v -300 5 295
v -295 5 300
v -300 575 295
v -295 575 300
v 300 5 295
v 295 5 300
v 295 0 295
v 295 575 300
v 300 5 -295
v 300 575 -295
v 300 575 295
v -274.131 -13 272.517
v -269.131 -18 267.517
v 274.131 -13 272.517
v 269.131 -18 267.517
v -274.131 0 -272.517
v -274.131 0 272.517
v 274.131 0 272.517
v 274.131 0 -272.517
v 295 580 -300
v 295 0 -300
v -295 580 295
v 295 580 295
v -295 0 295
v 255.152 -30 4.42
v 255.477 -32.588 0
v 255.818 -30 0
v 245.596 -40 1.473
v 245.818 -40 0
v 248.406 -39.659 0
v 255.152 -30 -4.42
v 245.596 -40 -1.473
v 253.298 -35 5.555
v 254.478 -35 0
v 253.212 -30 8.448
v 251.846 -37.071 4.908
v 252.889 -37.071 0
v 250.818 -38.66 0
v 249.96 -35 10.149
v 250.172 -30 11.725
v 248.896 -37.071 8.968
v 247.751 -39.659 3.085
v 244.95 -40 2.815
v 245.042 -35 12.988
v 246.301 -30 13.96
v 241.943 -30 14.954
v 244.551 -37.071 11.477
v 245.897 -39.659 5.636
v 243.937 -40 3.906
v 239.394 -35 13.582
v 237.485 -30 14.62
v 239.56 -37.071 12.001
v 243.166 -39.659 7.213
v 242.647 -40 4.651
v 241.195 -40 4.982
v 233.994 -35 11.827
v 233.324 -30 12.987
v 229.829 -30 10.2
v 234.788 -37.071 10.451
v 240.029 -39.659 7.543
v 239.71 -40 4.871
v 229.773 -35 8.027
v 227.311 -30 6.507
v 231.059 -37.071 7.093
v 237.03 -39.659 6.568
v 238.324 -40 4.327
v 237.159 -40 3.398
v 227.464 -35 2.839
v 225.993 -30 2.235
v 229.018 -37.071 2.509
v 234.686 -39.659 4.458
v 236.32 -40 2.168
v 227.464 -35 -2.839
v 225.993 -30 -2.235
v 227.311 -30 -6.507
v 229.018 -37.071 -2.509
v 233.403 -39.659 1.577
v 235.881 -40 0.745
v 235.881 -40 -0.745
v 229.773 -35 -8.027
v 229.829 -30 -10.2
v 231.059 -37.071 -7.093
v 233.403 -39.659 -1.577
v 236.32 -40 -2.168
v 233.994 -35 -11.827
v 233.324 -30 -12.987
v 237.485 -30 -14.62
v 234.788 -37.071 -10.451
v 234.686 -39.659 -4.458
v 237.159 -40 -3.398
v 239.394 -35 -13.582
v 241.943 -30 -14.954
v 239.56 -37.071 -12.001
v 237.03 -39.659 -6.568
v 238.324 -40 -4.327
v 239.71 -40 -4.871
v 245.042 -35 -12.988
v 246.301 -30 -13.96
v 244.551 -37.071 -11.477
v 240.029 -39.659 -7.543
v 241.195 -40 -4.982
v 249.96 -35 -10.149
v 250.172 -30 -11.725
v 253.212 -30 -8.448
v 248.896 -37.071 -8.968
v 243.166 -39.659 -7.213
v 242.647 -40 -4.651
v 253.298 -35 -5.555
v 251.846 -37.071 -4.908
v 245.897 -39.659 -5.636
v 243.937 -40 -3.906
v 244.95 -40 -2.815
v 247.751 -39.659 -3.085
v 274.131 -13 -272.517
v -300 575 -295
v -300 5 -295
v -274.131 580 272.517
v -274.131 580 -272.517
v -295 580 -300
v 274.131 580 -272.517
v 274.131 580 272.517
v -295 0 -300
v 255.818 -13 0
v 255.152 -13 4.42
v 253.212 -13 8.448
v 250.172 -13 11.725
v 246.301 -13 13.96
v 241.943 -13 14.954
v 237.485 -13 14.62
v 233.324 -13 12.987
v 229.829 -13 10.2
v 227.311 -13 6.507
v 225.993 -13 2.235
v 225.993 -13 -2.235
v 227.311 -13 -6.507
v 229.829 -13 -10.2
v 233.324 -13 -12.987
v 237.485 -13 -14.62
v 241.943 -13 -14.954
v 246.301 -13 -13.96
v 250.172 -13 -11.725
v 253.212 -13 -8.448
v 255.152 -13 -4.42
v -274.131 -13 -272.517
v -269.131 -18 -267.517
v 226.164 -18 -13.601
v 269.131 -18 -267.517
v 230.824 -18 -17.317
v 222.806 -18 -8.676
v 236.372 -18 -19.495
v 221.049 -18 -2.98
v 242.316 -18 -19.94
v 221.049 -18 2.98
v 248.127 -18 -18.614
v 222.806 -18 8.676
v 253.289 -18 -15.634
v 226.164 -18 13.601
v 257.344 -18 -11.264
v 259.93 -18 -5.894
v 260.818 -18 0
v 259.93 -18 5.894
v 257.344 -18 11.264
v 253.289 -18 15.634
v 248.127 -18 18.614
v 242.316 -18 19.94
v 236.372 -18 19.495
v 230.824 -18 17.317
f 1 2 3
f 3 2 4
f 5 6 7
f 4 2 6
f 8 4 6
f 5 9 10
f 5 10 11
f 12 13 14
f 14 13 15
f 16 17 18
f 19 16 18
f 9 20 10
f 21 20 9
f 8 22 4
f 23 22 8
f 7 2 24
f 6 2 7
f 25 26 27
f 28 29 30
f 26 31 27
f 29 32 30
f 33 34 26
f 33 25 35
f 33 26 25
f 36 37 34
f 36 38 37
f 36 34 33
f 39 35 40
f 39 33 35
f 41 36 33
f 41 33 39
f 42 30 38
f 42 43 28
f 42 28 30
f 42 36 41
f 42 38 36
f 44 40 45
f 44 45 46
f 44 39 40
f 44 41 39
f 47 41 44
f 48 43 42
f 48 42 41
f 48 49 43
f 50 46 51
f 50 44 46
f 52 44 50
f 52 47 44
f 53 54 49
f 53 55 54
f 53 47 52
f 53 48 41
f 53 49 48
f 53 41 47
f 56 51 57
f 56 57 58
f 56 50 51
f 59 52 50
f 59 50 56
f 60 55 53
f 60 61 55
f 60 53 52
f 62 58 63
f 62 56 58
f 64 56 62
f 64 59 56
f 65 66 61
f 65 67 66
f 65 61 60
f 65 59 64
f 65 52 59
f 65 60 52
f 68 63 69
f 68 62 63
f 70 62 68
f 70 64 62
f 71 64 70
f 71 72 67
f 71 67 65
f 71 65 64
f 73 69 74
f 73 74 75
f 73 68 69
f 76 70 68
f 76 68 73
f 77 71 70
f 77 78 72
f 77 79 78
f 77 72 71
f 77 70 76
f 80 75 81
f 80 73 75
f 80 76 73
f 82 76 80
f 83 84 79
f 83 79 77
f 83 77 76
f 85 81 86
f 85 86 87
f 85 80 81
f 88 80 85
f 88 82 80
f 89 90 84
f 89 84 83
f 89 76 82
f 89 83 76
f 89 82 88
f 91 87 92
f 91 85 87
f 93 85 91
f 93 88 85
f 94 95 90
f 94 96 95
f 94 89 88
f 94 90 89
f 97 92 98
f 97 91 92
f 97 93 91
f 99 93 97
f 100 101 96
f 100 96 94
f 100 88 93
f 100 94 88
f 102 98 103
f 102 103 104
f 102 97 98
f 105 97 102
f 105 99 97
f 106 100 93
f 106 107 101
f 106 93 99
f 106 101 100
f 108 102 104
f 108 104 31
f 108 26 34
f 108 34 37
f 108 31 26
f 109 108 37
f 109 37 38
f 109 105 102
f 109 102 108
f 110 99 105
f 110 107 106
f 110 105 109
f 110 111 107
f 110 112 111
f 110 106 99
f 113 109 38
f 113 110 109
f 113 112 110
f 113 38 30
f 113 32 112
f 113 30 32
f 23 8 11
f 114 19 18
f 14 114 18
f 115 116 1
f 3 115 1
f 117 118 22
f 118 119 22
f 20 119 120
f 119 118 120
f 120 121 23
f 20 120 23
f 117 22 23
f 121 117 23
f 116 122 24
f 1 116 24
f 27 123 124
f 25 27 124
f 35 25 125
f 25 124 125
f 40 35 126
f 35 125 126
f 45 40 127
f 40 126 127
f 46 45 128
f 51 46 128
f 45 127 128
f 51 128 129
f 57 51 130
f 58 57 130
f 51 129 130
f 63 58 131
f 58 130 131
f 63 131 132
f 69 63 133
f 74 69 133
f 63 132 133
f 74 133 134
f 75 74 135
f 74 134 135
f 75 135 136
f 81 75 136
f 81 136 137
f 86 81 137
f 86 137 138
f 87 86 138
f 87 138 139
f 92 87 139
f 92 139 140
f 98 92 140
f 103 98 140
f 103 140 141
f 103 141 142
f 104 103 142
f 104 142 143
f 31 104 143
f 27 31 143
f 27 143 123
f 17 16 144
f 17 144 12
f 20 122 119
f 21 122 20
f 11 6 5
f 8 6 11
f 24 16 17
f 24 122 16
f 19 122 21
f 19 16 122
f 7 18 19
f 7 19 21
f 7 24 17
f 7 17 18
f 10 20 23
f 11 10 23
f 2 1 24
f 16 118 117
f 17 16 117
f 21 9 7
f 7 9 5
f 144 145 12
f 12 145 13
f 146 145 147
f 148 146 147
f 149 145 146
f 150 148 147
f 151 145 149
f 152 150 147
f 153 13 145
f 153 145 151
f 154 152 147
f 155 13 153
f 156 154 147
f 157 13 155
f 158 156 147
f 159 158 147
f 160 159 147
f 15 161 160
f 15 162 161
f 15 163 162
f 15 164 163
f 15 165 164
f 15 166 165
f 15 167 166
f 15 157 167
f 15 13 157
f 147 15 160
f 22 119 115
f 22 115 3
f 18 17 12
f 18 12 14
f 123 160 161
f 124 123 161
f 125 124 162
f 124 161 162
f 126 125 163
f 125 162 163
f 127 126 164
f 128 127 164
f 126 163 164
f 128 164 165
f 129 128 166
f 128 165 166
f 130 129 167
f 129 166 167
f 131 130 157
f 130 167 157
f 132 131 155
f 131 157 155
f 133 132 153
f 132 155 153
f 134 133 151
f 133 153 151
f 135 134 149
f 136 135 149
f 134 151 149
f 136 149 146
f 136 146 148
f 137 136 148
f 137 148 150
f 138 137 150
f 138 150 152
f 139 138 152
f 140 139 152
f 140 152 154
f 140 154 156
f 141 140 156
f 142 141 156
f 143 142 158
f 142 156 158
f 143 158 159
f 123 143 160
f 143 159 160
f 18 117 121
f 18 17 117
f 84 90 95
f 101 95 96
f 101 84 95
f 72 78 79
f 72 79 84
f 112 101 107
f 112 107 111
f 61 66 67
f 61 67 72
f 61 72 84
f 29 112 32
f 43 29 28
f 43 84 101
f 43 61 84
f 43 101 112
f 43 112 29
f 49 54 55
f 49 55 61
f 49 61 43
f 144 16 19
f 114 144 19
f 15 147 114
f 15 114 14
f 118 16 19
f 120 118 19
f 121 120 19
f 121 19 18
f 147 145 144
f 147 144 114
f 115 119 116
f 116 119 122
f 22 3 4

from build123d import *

# Parameters (mm, degrees)
F0_W      = 600
F0_H      = 600
F0_W_2    = 548.26182127
F0_H_2    = 545.0347065926
F1_DEPTH  = 550
F2_DEPTH  = 30
F0_R      = 14.9962807739
F3_DEPTH  = 18
F4_SIZE   = 5
F4_2_SIZE = 5
F5_DEPTH  = 40
F6_R      = 10


with BuildPart() as f1:
    # F0 (on Front) → F1 (new body)
    with BuildSketch(Plane.XZ):
        Rectangle(F0_W, F0_H)
        Rectangle(F0_W_2, F0_H_2, mode=Mode.SUBTRACT)
    extrude(amount=-F1_DEPTH)

    # F2 (add): a face of the model
    f2_faces = [f1.faces().sort_by_distance(p)[0] for p in [
        (0, 550, 291.5147186258),
    ]]
    extrude(f2_faces, amount=F2_DEPTH)

    # F4
    f4_edges = [f1.edges().sort_by_distance(p)[0] for p in [
        (-300, 290, 300),
        (-300, 580, 0),
        (-300, 290, -300),
        (-300, 0, 0),
        (300, 290, 300),
        (0, 580, 300),
        (0, 0, 300),
        (300, 290, -300),
        (300, 580, 0),
        (300, 0, 0),
    ]]
    chamfer(f4_edges, length=F4_SIZE)


with BuildPart() as f3:
    # F0 (on Front) → F3 (new body)
    with BuildSketch(Plane.XZ):
        Rectangle(F0_W_2, F0_H_2)
        with Locations((240.8218532801, 0)):
            Circle(F0_R, mode=Mode.SUBTRACT)
    extrude(amount=F3_DEPTH)

    # F4#2
    f4_2_edges = [f3.edges().sort_by_distance(p)[0] for p in [
        (0, -18, 272.517353),
        (-274.130911, -18, 0),
        (0, -18, -272.517353),
        (274.130911, -18, 0),
        (225.825573, -18, 0),
    ]]
    chamfer(f4_2_edges, length=F4_2_SIZE)

    # F0 (on Front) → F5 (join)
    with BuildSketch(Plane.XZ):
        with Locations((240.8218532801, 0)):
            Circle(F0_R)
    extrude(amount=F5_DEPTH)

    # F6
    f6_edges = [f3.edges().sort_by_distance(p)[0] for p in [
        (225.825573, -40, 0),
    ]]
    fillet(f6_edges, radius=F6_R)


solid = Compound([f1.part, f3.part])
